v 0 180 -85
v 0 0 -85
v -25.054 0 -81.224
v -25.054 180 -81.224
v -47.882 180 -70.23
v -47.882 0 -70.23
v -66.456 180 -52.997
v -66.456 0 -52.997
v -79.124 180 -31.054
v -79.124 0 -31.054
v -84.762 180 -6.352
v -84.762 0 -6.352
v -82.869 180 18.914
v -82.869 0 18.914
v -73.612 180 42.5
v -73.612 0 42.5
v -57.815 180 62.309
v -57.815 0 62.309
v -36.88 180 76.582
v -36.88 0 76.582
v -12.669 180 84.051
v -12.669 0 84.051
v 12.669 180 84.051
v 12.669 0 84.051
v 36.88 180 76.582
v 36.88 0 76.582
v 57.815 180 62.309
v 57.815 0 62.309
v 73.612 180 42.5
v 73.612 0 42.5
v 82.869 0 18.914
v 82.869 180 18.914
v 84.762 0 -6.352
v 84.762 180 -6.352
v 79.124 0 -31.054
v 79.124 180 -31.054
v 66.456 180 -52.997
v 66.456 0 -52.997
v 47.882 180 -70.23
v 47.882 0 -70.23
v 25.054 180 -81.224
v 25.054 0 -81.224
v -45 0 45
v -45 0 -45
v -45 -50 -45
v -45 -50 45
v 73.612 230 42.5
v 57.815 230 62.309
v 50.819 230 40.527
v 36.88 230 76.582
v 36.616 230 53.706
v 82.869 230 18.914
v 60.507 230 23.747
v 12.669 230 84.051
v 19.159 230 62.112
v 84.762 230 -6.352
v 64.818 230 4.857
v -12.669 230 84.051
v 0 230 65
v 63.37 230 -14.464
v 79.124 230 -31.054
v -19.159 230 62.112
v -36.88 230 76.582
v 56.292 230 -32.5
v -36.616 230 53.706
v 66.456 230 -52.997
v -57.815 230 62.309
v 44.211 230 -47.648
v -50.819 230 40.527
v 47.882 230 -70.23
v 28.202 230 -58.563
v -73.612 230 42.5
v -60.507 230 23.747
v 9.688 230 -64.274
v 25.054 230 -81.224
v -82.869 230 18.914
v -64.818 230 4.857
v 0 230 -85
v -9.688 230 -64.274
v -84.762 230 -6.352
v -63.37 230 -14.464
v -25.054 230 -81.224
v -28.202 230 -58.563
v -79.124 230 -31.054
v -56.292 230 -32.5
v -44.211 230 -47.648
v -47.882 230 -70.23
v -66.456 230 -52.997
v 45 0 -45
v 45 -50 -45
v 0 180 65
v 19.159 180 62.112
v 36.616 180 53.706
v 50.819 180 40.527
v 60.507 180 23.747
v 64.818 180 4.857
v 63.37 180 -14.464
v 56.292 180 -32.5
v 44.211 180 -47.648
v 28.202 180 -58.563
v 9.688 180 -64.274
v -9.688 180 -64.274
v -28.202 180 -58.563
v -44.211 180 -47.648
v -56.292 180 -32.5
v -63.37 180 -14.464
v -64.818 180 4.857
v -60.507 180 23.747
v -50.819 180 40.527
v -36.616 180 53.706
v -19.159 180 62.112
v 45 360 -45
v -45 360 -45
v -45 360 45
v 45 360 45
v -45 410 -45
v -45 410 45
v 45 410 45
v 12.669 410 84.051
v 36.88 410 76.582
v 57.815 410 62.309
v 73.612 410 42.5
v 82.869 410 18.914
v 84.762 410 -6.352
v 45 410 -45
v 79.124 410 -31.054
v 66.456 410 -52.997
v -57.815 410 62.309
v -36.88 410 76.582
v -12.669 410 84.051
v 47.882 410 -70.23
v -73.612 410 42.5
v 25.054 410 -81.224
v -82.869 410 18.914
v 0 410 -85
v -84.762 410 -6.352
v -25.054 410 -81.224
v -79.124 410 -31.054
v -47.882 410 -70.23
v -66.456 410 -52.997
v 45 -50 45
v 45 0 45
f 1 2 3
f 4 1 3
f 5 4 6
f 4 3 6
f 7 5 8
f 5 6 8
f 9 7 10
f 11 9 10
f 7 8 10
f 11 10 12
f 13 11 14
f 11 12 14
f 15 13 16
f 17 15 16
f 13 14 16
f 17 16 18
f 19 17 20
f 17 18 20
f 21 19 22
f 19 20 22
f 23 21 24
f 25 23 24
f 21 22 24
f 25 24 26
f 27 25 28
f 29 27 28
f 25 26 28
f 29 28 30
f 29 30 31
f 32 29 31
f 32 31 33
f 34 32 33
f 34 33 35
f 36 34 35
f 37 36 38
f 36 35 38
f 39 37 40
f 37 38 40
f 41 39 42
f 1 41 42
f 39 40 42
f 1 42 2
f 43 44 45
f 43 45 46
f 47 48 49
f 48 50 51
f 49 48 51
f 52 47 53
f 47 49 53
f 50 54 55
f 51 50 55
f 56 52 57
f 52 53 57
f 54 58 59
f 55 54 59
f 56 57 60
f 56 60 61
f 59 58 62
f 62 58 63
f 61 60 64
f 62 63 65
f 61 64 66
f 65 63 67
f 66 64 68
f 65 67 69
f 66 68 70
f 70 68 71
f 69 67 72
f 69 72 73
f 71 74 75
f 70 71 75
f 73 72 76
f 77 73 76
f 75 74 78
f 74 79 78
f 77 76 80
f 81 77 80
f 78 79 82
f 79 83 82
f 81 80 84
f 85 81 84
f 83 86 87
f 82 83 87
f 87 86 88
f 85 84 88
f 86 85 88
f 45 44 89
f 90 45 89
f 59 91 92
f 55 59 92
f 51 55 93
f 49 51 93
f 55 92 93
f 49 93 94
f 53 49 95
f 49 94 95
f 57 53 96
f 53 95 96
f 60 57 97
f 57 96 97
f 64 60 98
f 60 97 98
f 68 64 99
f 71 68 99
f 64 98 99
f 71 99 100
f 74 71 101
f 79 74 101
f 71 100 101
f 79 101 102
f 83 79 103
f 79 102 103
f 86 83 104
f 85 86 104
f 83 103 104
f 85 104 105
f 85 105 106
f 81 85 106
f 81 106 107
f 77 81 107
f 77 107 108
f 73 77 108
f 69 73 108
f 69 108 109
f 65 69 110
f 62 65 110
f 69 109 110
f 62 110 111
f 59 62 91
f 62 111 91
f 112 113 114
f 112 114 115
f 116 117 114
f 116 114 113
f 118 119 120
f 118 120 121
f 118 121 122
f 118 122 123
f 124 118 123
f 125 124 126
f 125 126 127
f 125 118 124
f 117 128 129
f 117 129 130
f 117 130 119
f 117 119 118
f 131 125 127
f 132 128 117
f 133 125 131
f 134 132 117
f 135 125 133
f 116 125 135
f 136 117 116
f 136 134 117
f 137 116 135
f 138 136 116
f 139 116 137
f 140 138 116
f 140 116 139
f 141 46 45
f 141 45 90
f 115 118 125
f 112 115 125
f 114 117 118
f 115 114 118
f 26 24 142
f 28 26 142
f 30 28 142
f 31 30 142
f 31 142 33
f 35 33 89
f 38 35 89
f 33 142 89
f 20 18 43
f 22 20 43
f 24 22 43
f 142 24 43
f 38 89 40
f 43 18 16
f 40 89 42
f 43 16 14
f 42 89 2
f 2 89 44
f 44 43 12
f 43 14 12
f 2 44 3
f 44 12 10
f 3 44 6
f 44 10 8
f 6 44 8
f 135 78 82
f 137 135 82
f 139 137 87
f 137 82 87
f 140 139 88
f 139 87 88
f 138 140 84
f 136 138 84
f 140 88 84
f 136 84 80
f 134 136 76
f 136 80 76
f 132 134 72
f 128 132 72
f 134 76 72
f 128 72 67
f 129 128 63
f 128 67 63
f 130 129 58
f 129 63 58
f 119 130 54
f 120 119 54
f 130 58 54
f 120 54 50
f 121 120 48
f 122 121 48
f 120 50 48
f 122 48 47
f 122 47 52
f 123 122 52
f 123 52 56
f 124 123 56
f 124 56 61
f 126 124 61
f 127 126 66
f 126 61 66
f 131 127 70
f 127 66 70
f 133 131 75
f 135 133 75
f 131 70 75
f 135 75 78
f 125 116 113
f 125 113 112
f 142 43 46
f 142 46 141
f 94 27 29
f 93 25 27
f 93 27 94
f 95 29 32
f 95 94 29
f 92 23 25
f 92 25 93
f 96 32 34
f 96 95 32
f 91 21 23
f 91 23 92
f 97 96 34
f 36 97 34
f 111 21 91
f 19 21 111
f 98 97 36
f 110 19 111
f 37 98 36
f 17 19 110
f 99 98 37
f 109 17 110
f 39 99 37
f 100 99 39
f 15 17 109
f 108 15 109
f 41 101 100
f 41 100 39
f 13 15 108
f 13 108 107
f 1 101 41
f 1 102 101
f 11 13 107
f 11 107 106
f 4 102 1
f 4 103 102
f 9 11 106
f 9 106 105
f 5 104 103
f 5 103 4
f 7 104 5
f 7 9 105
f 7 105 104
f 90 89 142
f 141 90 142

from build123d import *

# Parameters (mm, degrees)
SKETCH1_R           = 85
BOSS_EXTRUDE2_DEPTH = 180
SKETCH2_W           = 90
SKETCH2_H           = 90
BOSS_EXTRUDE3_DEPTH = 50
SKETCH4_R           = 65
BOSS_EXTRUDE4_DEPTH = 50
SKETCH5_R           = 85
BOSS_EXTRUDE5_DEPTH = 180
SKETCH6_W           = 90
SKETCH6_H           = 90
CUT_EXTRUDE2_DEPTH  = 50


with BuildPart() as part:
    # Sketch1 → Boss-Extrude2 (new body)
    with BuildSketch(Plane(origin=(0, 0, 0), x_dir=(1, 0, 0), z_dir=(0, 1, 0))):
        with Locations(Location((0, 0, 0), (0, 0, 90))):
            Circle(SKETCH1_R)
    extrude(amount=BOSS_EXTRUDE2_DEPTH)

    # Sketch2 → Boss-Extrude3 (add)
    with BuildSketch(Plane.XZ):
        Rectangle(SKETCH2_W, SKETCH2_H)
    extrude(amount=BOSS_EXTRUDE3_DEPTH)

    # Sketch4 → Boss-Extrude4 (add)
    with BuildSketch(Plane(origin=(0, 180, 0), x_dir=(1, 0, 0), z_dir=(0, 1, 0))):
        with Locations(Location((0, 0, 0), (0, 0, 270))):
            Circle(SKETCH4_R)
    extrude(amount=BOSS_EXTRUDE4_DEPTH)

    # Sketch5 → Boss-Extrude5 (add)
    with BuildSketch(Plane(origin=(0, 230, 0), x_dir=(1, 0, 0), z_dir=(0, 1, 0))):
        with Locations(Location((0, 0, 0), (0, 0, 90))):
            Circle(SKETCH5_R)
    extrude(amount=BOSS_EXTRUDE5_DEPTH)

    # Sketch6 → Cut-Extrude2 (cut)
    with BuildSketch(Plane(origin=(0, 410, 0), x_dir=(1, 0, 0), z_dir=(0, 1, 0))):
        Rectangle(SKETCH6_W, SKETCH6_H)
    extrude(amount=-CUT_EXTRUDE2_DEPTH, mode=Mode.SUBTRACT)


solid = part.part
